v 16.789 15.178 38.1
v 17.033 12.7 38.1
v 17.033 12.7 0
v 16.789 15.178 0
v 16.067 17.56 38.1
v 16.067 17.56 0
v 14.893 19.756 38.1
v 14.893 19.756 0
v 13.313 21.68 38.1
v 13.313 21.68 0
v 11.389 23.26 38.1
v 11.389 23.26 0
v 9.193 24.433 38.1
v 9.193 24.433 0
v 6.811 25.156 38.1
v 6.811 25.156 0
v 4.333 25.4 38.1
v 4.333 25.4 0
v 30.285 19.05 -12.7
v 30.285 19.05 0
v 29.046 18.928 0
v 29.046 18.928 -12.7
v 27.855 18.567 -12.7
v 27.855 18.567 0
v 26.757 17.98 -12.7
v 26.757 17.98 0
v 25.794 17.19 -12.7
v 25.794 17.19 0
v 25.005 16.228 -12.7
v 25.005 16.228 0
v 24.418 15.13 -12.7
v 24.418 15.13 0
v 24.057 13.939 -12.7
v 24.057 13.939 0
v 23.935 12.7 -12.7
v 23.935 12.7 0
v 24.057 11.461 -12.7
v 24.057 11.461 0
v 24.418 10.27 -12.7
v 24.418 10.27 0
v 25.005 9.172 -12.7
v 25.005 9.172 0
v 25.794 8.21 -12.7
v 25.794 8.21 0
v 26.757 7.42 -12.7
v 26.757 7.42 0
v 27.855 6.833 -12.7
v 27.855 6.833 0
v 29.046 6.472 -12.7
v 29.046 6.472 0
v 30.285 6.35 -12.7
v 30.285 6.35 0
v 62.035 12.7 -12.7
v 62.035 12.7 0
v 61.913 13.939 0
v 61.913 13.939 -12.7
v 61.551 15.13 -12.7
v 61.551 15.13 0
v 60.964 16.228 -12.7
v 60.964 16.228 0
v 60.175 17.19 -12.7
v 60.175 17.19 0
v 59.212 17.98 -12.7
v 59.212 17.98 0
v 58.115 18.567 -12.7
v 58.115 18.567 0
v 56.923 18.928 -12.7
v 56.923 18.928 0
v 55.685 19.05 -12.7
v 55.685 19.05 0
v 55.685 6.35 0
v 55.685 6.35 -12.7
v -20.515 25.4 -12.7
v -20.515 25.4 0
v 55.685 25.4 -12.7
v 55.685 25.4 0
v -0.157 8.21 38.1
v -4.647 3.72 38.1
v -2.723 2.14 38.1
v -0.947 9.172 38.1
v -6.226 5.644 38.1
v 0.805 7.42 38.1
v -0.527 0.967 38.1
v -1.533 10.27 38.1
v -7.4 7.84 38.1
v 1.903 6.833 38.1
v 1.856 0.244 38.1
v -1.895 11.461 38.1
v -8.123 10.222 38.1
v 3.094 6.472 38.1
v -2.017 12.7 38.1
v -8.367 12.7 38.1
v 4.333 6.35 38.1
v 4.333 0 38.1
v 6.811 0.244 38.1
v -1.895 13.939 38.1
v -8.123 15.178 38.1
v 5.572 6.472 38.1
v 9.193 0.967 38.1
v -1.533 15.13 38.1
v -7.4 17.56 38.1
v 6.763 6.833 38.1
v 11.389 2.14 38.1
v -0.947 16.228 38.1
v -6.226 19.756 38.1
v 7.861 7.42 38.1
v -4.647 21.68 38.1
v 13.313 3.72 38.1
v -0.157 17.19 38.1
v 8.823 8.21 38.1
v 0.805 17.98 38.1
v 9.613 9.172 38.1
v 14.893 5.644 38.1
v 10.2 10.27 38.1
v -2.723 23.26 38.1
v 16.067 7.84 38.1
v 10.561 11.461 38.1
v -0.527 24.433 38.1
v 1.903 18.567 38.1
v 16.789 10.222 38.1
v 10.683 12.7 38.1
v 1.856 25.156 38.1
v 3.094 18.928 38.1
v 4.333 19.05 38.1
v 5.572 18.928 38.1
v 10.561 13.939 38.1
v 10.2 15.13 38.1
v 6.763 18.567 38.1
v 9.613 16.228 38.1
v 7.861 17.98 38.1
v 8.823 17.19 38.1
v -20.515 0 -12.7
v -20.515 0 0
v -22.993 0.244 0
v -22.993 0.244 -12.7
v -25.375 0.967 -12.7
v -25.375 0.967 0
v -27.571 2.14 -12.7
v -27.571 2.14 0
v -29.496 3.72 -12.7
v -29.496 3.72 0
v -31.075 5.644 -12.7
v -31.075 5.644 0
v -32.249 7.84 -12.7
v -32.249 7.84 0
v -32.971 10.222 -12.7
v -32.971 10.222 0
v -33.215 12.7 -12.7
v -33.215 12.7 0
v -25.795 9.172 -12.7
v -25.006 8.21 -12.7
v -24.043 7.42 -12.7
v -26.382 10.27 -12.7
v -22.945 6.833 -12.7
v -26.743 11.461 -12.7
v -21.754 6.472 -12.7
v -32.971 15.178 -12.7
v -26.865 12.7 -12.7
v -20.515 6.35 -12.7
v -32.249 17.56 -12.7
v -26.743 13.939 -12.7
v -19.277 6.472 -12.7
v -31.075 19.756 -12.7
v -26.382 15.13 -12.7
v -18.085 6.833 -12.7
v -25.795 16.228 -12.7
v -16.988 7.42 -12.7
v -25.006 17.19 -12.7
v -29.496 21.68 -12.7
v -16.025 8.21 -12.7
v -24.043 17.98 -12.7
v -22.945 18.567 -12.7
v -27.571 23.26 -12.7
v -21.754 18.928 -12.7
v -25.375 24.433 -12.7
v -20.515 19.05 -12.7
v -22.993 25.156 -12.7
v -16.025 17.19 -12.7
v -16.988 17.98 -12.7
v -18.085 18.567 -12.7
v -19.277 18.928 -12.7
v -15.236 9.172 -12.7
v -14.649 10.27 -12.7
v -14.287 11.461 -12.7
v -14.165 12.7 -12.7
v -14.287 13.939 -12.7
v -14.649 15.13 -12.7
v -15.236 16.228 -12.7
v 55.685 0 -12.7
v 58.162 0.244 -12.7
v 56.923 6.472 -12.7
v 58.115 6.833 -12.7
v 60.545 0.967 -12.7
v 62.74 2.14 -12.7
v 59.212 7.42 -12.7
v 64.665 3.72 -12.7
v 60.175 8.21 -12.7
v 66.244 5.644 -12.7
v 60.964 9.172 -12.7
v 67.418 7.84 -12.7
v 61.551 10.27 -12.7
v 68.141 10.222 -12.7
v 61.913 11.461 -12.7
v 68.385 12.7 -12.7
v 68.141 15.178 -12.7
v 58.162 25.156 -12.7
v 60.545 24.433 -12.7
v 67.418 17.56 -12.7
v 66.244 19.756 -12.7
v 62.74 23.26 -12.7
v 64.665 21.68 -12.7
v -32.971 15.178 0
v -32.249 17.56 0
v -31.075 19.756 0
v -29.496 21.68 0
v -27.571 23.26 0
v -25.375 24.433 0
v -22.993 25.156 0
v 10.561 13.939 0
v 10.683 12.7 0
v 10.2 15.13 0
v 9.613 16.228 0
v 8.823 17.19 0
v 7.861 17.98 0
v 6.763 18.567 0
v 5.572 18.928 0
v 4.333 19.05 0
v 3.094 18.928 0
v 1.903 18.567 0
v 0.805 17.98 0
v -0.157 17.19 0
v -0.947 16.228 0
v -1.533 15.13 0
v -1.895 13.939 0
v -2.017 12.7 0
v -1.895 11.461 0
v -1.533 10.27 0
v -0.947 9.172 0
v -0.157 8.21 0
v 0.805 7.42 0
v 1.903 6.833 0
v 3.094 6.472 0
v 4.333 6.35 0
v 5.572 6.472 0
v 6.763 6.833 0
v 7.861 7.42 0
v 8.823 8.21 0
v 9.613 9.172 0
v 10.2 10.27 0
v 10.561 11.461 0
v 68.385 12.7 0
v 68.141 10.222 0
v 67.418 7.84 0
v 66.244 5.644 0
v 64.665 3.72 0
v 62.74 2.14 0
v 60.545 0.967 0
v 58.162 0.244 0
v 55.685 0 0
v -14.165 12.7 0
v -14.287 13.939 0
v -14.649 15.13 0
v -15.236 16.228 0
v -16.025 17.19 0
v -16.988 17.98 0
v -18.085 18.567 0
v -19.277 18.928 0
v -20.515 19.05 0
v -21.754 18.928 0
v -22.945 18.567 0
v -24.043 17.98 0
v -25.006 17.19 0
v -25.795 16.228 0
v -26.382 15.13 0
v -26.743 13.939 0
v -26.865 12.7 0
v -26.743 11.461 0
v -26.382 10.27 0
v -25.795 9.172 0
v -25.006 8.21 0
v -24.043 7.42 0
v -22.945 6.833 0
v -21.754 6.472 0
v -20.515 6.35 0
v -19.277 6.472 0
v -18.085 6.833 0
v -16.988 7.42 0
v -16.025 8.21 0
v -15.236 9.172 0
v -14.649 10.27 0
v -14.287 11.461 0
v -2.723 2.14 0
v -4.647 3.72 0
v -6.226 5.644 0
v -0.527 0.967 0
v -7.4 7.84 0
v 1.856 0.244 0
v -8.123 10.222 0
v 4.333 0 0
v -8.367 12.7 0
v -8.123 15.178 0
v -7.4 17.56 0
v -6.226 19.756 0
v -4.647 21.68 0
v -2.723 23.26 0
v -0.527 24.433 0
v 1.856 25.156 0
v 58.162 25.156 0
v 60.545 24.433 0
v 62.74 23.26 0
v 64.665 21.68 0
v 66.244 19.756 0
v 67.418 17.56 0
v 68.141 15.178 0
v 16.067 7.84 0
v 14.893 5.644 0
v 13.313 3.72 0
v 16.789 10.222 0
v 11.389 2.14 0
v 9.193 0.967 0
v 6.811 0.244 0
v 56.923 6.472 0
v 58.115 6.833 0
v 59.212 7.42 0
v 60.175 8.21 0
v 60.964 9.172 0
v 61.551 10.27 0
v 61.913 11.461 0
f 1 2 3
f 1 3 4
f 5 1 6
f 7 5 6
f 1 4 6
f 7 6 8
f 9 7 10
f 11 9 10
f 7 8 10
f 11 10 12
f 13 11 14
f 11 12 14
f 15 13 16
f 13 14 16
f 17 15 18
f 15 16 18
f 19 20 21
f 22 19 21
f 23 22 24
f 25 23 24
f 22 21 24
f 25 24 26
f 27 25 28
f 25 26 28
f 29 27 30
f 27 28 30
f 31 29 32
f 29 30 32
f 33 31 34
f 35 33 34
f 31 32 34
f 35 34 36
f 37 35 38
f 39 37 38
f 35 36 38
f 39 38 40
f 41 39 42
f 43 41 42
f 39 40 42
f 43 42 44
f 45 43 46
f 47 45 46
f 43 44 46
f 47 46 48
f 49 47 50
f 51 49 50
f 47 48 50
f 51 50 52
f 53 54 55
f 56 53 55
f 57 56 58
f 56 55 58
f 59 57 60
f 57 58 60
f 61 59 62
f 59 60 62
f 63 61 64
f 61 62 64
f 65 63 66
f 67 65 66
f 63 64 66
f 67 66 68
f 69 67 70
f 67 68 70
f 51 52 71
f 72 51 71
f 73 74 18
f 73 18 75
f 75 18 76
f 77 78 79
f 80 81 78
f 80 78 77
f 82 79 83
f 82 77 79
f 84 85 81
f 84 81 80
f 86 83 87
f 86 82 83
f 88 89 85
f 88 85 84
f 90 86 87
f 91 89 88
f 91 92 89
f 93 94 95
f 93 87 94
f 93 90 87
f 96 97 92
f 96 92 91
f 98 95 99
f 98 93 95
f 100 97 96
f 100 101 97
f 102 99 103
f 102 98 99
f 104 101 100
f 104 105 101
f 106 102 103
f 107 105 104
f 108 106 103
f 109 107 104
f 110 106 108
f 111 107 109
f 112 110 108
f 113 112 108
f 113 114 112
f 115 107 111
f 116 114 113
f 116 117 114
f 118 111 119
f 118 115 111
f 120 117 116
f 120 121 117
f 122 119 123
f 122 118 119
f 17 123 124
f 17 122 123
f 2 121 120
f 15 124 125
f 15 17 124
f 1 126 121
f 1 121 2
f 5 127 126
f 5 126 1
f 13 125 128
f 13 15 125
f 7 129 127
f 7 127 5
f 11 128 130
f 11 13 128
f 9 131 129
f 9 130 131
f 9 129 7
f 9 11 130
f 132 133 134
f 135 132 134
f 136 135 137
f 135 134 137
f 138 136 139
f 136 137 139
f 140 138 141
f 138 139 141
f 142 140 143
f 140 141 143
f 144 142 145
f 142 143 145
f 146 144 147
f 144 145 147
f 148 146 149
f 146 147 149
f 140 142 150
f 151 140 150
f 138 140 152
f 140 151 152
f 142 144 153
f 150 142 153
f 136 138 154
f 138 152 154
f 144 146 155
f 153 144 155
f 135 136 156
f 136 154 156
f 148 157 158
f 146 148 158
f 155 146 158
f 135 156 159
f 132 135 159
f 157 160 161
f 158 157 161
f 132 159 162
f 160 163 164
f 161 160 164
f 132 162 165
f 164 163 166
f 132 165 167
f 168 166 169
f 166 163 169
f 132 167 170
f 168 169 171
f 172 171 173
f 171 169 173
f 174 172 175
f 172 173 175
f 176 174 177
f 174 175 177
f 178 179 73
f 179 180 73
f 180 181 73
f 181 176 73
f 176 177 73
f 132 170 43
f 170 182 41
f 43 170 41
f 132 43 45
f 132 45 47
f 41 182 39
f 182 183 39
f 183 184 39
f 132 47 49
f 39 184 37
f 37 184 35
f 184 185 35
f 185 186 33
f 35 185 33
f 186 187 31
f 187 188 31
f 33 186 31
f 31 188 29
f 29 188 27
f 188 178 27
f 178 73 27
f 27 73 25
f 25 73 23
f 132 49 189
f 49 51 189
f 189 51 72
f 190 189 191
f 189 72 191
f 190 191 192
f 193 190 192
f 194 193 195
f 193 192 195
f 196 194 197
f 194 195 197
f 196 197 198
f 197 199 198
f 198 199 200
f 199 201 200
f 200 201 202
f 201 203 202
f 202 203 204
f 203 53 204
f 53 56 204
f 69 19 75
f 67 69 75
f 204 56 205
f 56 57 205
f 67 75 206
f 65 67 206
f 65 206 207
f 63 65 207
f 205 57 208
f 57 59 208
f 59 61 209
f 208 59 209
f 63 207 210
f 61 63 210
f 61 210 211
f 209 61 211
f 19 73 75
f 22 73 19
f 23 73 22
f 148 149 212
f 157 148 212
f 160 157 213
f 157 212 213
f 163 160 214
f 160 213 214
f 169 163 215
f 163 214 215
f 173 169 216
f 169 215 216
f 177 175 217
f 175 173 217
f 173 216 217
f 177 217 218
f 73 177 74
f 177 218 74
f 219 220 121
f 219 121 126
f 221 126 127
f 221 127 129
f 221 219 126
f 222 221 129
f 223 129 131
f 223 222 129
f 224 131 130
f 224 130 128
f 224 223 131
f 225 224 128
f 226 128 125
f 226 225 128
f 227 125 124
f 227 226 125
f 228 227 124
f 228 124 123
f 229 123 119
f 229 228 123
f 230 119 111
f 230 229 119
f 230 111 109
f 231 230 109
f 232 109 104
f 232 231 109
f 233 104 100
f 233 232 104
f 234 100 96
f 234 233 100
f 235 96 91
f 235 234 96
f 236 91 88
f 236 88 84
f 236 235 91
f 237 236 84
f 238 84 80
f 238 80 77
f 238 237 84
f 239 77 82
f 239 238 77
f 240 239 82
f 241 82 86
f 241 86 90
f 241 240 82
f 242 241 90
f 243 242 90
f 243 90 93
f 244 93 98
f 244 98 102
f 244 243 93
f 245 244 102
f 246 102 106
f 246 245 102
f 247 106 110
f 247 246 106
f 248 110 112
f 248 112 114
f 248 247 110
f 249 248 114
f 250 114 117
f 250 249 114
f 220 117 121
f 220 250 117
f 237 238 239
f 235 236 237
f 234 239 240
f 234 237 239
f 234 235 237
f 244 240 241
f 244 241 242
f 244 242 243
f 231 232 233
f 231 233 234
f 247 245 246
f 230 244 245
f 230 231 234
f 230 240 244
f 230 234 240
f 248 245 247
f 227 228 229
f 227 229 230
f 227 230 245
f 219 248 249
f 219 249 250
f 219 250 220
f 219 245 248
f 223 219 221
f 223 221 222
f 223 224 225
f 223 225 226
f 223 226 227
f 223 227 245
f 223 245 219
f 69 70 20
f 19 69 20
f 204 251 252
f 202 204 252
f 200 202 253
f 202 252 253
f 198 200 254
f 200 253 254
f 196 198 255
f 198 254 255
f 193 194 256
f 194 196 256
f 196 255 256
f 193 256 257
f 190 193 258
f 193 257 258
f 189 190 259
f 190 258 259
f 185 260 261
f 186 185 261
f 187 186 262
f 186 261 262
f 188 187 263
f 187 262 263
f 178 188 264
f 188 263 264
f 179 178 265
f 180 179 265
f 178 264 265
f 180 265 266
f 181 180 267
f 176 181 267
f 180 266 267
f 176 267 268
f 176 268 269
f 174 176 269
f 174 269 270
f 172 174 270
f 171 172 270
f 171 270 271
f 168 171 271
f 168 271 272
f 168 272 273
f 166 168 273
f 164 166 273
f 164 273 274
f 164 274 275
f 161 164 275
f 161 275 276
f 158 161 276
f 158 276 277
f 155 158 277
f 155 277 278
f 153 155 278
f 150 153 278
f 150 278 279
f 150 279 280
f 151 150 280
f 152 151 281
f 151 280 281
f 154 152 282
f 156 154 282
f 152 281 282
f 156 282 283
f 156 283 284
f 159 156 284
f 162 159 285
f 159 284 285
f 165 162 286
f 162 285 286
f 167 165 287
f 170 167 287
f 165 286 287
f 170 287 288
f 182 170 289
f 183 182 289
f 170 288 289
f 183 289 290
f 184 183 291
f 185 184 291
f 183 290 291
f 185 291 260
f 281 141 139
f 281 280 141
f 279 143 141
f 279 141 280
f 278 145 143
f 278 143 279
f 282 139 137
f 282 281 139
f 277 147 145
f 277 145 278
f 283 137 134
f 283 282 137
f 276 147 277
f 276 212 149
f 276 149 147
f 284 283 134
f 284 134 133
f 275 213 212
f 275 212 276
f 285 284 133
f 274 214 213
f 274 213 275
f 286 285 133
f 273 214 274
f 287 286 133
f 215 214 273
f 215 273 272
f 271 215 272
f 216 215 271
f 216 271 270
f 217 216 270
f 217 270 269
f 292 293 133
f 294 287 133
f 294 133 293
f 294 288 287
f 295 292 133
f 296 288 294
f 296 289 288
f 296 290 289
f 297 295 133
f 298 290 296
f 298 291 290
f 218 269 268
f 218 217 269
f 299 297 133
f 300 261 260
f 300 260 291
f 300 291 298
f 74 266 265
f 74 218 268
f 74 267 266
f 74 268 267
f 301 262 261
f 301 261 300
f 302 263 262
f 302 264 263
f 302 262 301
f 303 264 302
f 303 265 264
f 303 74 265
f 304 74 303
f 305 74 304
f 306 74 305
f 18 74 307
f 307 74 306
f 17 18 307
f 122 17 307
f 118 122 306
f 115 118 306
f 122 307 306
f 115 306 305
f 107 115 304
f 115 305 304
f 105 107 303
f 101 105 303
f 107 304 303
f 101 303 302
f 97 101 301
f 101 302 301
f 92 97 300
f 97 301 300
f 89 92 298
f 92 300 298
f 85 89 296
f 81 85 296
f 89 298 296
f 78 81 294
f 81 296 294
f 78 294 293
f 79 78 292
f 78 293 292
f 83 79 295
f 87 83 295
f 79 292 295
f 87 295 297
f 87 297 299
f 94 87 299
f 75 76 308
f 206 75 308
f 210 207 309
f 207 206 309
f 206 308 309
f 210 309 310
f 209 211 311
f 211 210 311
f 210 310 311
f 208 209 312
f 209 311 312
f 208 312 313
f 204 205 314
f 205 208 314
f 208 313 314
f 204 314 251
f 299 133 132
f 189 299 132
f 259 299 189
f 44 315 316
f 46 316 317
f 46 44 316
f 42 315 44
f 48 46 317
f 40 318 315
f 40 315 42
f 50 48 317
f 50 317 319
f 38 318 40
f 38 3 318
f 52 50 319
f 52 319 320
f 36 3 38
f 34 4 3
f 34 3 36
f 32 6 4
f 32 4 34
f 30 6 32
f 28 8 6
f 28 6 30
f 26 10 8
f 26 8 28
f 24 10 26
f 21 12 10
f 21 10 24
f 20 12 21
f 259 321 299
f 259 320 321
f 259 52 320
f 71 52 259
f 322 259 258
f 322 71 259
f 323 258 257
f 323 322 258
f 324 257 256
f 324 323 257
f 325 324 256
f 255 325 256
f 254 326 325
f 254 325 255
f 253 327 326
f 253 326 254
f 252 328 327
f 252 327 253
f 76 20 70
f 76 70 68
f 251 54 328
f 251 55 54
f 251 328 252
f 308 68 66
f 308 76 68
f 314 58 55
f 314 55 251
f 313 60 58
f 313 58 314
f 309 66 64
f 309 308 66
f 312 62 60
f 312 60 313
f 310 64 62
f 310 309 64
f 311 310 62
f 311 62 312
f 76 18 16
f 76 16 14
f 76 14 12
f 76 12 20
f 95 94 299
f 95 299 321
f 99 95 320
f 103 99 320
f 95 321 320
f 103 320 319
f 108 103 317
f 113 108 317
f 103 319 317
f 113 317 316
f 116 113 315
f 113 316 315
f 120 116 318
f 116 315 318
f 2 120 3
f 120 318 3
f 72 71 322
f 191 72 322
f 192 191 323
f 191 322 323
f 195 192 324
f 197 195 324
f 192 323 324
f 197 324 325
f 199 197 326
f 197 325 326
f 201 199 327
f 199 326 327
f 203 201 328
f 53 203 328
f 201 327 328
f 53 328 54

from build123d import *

# Parameters (mm, degrees)
F0_W     = 101.6
F0_H     = 25.4
F1_DEPTH = 12.7
F2_R     = 6.35
F3_DEPTH = 25.4
F4_R     = 6.35
F5_DEPTH = 38.1


with BuildPart() as f1:
    # F0 (on Top) → F1 (new body)
    with BuildSketch(Plane.XY):
        with Locations((17.584615, 12.7)):
            Rectangle(F0_W, F0_H)
    extrude(amount=-F1_DEPTH)

    # F2 (on face) → F3 (cut)
    with BuildSketch(Plane.XY):
        with BuildLine():
            ThreePointArc((55.684615, 6.35), (60.174744, 8.209872), (62.034615, 12.7))
            ThreePointArc((62.034615, 12.7), (60.174744, 17.190128), (55.684615, 19.05))
            ThreePointArc((55.684615, 19.05), (49.334615, 12.7), (55.684615, 6.35))
        make_face()
        with BuildLine():
            ThreePointArc((36.634615, 12.7), (34.774744, 17.190128), (30.284615, 19.05))
            ThreePointArc((30.284615, 19.05), (23.934615, 12.7), (30.284615, 6.35))
            ThreePointArc((30.284615, 6.35), (34.774744, 8.209872), (36.634615, 12.7))
        make_face()
        with BuildLine():
            ThreePointArc((-33.215385, 12.7), (-29.495641, 21.680256), (-20.515385, 25.4))
            Line((-20.515385, 25.4), (-33.215385, 25.4))
            Line((-33.215385, 25.4), (-33.215385, 12.7))
        make_face()
        with BuildLine():
            ThreePointArc((-20.515385, 0), (-29.495641, 3.719744), (-33.215385, 12.7))
            Line((-33.215385, 12.7), (-33.215385, 0))
            Line((-33.215385, 0), (-20.515385, 0))
        make_face()
        with BuildLine():
            Line((68.384615, 25.4), (55.684615, 25.4))
            ThreePointArc((55.684615, 25.4), (64.664872, 21.680256), (68.384615, 12.7))
            Line((68.384615, 12.7), (68.384615, 25.4))
        make_face()
        with BuildLine():
            Line((68.384615, 0), (68.384615, 12.7))
            ThreePointArc((68.384615, 12.7), (64.664872, 3.719744), (55.684615, 0))
            Line((55.684615, 0), (68.384615, 0))
        make_face()
        with BuildLine():
            ThreePointArc((55.684615, 6.35), (49.334615, 12.7), (55.684615, 19.05))
            Line((55.684615, 19.05), (30.284615, 19.05))
            ThreePointArc((30.284615, 19.05), (34.774744, 17.190128), (36.634615, 12.7))
            ThreePointArc((36.634615, 12.7), (34.774744, 8.209872), (30.284615, 6.35))
            Line((30.284615, 6.35), (55.684615, 6.35))
        make_face()
        with Locations((-20.515385, 12.7)):
            Circle(F2_R)
    extrude(amount=-F3_DEPTH, mode=Mode.SUBTRACT)

    # F4 (on face) → F5 (join)
    with BuildSketch(Plane.XY):
        with BuildLine():
            ThreePointArc((4.333231, 0), (13.313487, 3.719744), (17.033231, 12.7))
            ThreePointArc((17.033231, 12.7), (13.313487, 21.680256), (4.333231, 25.4))
            ThreePointArc((4.333231, 25.4), (-8.366769, 12.7), (4.333231, 0))
        make_face()
        with Locations((4.333231, 12.7)):
            Circle(F4_R, mode=Mode.SUBTRACT)
    extrude(amount=F5_DEPTH)


solid = f1.part
